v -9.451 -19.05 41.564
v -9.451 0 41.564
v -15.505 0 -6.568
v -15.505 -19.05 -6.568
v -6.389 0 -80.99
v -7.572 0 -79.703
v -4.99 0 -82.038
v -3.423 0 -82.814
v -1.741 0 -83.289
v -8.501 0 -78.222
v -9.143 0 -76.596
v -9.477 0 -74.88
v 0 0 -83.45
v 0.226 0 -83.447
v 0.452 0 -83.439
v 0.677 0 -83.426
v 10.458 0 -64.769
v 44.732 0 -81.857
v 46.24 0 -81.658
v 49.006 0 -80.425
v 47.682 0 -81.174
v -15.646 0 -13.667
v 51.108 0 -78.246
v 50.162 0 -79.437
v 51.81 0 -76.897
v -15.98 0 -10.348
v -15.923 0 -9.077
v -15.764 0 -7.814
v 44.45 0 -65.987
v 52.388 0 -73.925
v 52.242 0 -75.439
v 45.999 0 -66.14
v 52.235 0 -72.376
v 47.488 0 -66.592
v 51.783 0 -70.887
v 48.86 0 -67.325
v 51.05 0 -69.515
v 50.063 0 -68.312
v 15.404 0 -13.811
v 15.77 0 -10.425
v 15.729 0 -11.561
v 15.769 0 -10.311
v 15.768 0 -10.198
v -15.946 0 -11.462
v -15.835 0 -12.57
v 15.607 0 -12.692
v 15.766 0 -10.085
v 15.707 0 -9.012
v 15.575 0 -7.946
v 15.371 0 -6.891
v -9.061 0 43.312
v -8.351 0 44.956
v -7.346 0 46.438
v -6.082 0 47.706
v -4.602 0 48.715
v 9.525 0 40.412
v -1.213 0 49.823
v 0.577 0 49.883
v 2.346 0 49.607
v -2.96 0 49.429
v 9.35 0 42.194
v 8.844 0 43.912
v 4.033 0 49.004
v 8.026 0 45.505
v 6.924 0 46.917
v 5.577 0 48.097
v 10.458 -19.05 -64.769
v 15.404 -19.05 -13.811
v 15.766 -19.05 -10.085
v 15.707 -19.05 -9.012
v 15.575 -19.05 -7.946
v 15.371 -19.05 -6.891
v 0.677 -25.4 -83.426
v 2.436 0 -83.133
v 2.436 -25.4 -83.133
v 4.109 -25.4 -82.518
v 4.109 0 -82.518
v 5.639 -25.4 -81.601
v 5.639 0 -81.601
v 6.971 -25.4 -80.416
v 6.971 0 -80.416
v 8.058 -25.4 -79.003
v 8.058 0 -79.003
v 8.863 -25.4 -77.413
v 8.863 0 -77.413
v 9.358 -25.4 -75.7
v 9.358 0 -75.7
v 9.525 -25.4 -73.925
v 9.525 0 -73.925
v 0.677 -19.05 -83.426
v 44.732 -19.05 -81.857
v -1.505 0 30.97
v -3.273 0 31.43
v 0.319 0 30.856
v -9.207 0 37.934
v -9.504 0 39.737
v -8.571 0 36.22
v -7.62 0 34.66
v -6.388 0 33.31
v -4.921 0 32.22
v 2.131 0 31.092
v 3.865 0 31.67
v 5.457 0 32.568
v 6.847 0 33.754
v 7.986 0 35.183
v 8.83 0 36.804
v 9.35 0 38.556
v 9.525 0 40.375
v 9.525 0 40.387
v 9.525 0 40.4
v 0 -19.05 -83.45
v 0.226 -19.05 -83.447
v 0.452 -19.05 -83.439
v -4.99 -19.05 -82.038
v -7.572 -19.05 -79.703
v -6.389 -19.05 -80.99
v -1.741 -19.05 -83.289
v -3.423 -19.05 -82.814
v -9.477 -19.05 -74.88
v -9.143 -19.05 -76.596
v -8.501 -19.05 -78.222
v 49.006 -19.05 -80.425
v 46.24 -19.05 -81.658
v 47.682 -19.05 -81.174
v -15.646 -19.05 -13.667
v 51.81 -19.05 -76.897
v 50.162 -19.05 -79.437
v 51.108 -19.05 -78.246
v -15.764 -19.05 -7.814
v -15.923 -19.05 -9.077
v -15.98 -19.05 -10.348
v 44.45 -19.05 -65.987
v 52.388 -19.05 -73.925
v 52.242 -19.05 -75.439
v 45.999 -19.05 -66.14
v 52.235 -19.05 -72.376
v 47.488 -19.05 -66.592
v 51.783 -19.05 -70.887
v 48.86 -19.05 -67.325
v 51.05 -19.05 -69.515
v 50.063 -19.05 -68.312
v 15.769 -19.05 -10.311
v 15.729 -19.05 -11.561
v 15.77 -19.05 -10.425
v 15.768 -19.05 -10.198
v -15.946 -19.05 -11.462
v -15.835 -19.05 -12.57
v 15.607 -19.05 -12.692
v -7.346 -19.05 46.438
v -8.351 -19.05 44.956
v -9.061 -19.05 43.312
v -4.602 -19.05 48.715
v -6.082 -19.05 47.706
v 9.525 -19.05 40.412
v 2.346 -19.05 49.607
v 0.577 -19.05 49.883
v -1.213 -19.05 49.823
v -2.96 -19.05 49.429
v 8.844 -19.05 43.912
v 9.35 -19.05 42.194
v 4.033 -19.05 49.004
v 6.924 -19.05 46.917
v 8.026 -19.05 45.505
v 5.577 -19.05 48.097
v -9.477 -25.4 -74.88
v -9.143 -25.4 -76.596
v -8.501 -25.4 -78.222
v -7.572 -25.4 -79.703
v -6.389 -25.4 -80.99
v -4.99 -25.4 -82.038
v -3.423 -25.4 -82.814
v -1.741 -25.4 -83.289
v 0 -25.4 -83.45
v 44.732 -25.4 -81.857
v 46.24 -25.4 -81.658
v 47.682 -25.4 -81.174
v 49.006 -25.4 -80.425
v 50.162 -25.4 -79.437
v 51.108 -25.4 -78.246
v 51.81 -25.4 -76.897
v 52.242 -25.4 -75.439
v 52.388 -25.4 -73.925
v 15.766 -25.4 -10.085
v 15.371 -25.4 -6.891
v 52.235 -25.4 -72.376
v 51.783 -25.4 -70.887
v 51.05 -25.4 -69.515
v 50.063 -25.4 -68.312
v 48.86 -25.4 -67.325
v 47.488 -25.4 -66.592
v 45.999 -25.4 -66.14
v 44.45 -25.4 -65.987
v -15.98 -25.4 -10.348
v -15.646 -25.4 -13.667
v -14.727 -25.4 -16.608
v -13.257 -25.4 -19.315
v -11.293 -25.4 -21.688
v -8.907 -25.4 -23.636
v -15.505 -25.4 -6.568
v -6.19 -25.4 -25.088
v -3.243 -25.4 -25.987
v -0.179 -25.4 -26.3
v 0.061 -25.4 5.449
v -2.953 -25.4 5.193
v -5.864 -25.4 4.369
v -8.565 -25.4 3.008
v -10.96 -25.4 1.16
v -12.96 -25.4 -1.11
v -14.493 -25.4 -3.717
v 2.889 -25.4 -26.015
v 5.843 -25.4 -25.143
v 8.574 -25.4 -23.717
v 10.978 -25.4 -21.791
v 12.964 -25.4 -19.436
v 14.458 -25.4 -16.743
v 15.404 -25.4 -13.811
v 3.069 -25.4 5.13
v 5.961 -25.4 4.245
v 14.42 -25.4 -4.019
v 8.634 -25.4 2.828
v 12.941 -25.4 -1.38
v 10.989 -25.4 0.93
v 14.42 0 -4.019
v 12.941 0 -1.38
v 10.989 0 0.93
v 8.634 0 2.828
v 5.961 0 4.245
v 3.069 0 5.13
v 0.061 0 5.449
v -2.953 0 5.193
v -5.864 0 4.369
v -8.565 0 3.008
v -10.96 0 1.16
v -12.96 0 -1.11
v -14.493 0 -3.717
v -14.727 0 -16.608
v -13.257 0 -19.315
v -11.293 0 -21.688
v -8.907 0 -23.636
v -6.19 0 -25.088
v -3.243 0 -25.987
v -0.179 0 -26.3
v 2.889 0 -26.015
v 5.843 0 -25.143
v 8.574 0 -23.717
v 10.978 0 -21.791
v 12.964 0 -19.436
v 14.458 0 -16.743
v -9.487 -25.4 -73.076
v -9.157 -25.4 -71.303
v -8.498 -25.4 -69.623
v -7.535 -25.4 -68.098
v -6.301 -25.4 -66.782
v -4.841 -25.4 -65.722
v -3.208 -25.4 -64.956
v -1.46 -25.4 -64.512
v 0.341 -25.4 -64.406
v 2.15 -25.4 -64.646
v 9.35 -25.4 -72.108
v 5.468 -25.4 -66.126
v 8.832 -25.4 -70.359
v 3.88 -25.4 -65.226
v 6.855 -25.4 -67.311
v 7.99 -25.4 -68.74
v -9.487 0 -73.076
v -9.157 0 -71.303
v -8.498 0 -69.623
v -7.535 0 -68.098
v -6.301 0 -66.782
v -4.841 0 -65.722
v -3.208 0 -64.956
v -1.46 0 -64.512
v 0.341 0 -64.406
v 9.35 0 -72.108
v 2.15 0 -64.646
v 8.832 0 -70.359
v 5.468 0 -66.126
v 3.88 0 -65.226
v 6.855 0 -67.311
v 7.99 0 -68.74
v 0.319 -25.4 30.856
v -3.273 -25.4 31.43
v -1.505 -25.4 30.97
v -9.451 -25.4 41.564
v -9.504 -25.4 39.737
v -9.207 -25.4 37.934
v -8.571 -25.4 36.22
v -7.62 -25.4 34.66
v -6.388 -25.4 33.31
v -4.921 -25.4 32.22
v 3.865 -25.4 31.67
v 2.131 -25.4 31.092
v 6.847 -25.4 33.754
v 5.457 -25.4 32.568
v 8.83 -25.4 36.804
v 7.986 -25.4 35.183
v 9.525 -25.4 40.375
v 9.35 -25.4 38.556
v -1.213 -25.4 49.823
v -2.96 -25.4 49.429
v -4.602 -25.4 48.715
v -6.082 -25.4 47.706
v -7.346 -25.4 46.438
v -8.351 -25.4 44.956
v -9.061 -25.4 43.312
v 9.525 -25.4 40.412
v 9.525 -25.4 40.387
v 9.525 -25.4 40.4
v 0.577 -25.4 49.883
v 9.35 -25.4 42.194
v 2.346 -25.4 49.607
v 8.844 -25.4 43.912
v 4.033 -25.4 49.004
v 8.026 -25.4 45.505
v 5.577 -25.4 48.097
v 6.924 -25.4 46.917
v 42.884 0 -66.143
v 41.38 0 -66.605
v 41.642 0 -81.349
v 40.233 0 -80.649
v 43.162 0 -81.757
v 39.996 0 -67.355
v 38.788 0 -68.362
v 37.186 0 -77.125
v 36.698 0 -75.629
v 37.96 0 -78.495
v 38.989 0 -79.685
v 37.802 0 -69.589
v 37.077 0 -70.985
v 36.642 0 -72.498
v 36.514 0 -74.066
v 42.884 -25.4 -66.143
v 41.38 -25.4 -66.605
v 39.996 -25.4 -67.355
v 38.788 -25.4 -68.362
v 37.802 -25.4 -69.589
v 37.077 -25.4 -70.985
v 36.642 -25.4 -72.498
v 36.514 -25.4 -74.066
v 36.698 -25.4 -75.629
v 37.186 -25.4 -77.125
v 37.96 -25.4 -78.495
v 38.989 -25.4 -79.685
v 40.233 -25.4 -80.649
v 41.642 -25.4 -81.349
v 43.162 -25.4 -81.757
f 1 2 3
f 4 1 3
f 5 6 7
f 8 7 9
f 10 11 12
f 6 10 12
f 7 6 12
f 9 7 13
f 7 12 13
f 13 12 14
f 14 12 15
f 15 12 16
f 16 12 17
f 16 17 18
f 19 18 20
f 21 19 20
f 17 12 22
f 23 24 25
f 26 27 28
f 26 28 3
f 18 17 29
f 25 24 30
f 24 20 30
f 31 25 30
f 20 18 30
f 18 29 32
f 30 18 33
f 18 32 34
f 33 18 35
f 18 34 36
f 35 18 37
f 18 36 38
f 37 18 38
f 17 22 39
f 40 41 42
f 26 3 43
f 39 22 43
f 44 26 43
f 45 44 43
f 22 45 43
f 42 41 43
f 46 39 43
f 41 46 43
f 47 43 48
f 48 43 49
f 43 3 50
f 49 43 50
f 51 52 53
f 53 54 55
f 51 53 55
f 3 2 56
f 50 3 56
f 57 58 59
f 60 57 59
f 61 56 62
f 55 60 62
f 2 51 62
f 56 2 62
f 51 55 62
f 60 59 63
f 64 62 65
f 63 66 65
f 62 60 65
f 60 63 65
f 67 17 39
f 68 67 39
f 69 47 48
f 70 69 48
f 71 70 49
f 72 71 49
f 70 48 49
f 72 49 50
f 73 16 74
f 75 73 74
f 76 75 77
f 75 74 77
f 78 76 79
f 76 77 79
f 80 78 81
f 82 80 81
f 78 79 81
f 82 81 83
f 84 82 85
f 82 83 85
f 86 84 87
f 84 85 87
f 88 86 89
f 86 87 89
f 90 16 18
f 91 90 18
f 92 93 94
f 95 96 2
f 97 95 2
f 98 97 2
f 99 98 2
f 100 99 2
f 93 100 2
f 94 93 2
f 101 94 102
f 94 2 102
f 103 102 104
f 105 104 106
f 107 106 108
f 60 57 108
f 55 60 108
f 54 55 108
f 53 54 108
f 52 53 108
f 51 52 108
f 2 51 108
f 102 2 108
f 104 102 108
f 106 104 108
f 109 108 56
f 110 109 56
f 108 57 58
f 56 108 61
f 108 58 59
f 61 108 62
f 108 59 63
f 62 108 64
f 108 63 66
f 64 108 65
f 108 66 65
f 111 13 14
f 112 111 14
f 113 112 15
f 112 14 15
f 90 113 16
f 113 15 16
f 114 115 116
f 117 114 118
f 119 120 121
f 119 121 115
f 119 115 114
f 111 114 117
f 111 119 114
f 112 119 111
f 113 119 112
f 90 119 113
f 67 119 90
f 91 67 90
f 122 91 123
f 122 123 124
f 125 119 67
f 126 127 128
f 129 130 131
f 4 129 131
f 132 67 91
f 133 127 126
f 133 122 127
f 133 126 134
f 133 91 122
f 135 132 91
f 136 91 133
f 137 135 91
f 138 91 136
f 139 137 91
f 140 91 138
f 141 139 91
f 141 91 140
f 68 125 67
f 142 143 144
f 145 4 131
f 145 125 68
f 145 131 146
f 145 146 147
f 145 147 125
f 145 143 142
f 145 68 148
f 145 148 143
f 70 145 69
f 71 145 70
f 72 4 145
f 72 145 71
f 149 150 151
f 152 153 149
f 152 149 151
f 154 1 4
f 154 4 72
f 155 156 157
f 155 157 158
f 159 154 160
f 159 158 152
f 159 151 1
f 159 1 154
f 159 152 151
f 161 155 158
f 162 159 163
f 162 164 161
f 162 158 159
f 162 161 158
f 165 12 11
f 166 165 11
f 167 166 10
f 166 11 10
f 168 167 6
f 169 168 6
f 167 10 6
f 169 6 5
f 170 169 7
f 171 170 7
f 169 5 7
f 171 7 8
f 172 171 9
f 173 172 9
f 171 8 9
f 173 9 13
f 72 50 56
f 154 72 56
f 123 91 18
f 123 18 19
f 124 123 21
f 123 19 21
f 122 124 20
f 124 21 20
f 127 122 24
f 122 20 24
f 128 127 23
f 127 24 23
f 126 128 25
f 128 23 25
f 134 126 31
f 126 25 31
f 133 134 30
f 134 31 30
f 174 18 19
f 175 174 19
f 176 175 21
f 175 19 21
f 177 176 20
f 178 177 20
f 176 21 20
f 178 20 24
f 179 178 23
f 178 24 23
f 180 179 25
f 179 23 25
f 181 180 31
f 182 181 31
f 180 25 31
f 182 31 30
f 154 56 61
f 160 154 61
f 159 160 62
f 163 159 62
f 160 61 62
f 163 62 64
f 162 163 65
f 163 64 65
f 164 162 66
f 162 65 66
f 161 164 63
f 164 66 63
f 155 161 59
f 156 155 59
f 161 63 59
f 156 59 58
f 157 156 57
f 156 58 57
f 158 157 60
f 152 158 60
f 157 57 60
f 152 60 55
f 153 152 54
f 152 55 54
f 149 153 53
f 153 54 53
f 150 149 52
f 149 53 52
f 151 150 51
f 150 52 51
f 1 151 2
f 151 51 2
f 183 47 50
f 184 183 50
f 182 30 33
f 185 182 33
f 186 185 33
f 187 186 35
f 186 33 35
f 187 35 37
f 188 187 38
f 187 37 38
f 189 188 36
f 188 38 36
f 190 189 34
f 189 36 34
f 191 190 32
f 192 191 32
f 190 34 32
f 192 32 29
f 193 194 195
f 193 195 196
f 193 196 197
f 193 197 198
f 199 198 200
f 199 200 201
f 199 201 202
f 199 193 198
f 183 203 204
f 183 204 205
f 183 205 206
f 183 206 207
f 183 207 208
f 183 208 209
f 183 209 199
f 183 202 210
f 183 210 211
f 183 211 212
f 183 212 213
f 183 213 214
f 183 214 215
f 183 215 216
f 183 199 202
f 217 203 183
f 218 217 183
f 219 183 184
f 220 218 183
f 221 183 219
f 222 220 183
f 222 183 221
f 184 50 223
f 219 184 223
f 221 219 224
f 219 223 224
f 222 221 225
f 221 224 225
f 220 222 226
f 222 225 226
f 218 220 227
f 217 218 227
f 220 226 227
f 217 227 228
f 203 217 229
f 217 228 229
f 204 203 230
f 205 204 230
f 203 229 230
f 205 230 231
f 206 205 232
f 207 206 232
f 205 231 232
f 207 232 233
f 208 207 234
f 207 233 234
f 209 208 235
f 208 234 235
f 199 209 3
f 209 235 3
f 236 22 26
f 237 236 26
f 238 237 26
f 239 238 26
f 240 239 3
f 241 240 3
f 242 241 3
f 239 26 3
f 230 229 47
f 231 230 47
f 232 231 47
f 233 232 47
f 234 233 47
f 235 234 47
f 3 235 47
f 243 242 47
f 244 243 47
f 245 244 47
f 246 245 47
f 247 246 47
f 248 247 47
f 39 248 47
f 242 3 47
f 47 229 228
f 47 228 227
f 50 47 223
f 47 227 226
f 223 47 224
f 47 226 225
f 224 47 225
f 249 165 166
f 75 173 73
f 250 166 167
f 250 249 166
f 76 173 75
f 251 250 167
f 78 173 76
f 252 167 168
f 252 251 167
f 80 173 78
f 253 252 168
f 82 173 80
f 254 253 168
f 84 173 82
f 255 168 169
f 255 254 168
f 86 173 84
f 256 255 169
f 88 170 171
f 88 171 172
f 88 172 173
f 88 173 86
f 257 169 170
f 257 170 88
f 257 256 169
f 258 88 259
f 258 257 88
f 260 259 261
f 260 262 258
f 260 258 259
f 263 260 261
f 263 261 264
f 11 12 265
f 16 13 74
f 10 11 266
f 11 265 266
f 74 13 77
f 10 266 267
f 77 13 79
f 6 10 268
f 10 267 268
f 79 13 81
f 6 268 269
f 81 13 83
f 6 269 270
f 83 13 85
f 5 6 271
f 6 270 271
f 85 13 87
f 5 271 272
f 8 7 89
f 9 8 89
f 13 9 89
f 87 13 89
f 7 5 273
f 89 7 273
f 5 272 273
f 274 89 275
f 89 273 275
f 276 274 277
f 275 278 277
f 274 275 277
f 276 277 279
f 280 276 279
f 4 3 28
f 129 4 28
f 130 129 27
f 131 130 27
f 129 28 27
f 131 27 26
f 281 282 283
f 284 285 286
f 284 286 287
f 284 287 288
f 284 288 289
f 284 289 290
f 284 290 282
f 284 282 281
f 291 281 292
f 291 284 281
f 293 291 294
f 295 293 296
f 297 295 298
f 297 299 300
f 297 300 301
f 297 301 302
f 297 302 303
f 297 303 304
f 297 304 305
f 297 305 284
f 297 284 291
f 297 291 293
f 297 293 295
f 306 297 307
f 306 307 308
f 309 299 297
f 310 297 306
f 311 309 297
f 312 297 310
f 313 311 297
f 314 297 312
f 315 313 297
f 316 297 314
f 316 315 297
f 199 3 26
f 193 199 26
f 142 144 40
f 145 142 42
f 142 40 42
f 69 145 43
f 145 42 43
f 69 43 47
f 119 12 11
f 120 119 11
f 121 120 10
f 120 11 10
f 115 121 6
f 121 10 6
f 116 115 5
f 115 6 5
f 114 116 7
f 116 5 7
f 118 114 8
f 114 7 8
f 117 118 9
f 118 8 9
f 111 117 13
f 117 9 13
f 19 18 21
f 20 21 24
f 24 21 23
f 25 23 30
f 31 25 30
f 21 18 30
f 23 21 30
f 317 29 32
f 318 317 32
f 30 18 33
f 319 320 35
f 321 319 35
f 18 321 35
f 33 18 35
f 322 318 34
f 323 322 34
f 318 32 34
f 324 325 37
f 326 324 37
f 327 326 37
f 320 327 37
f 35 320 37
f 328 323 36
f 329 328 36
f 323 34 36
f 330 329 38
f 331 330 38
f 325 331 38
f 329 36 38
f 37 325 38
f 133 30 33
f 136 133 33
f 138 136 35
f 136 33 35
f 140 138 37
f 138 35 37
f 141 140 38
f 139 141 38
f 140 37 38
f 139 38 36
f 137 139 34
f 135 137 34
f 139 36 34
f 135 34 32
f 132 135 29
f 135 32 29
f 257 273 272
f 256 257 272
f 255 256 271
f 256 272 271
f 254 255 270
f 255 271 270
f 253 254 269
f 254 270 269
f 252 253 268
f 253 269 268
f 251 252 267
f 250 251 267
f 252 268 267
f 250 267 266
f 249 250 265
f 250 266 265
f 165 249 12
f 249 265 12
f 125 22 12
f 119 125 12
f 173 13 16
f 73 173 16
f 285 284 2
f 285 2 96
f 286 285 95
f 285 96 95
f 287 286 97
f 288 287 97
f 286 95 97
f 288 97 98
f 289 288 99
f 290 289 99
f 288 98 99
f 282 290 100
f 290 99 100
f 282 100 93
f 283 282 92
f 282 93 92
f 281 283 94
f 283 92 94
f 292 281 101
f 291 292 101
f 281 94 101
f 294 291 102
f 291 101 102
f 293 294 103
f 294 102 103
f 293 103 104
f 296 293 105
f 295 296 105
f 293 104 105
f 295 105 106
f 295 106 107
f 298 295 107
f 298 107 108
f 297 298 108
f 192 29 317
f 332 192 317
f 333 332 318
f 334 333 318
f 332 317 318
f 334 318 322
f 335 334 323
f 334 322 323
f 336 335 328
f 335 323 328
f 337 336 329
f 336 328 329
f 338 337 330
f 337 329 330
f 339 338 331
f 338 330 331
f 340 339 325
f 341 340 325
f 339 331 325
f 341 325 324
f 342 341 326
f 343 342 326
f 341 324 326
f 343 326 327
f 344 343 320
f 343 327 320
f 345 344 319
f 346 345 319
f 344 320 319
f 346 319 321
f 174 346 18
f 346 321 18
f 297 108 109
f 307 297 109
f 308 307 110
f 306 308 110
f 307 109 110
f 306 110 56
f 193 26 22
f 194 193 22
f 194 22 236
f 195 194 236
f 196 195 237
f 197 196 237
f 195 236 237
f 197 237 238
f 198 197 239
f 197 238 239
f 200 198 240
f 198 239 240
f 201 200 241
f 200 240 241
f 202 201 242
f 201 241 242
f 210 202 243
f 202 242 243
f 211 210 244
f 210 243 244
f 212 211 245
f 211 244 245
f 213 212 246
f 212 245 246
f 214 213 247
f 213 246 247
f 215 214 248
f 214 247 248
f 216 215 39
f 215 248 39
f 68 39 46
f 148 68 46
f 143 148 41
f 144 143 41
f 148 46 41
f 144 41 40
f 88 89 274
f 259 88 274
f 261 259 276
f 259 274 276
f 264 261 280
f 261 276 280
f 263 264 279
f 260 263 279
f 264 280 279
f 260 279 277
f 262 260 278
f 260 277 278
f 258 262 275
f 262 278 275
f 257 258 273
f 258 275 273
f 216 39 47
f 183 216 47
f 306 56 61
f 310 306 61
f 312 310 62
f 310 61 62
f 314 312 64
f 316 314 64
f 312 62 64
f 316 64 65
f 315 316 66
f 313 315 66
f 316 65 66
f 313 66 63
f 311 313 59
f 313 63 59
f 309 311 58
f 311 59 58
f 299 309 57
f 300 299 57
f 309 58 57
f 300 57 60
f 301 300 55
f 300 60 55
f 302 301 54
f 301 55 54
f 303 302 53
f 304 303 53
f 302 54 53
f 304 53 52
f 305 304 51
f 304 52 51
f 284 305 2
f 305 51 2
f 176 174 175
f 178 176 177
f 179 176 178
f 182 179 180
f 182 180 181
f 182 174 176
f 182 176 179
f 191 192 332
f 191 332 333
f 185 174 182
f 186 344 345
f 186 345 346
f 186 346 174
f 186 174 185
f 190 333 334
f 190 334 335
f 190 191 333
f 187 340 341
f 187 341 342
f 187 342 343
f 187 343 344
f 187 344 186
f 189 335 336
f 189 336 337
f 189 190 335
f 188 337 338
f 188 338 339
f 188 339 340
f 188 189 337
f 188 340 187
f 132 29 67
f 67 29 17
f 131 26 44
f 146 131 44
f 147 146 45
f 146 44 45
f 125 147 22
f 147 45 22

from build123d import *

# Parameters (mm, degrees)
F1_DEPTH = 25.4
F2_DEPTH = 19.05


with BuildPart() as f1:
    # F0 (on Front) → F1 (new body)
    with BuildSketch(Plane.XZ):
        with BuildLine():
            ThreePointArc((-9.4505353604, 41.5638555321), (-0.5955147738, 30.8687904621), (9.525, 40.3751560744))
            ThreePointArc((9.525, 40.3751560744), (9.5249820462, 40.3936498602), (9.5249281848, 40.4121435763))
            ThreePointArc((9.5249281848, 40.4121435763), (0.5770560461, 49.8826600223), (-9.4505353604, 41.5638555321))
        make_face()
    extrude(amount=F1_DEPTH)


with BuildPart() as f1b:
    # F0 (on Front) → F1, piece 2 (new body)
    with BuildSketch(Plane.XZ):
        with BuildLine():
            Line((15.7660711788, -10.0846397195), (15.371304716, -6.8906035395))
            ThreePointArc((15.371304716, -6.8906035395), (0.0606968294, 5.4492883552), (-15.5045872563, -6.5677652421))
            Line((-15.5045872563, -6.5677652421), (-15.9800981954, -10.3482270861))
            Line((-15.9800981954, -10.3482270861), (-15.6456242534, -13.6672845653))
            ThreePointArc((-15.6456242534, -13.6672845653), (-0.1786997991, -26.2996741605), (15.4044031981, -13.810882388))
            Line((15.4044031981, -13.810882388), (15.7660711788, -10.0846397195))
        make_face()
    extrude(amount=F1_DEPTH)


with BuildPart() as f1c:
    # F0 (on Front) → F1, piece 3 (new body)
    with BuildSketch(Plane.XZ):
        with BuildLine():
            ThreePointArc((0.3412708989, -64.4059595806), (-6.9491816059, -67.4106670775), (-9.4770004124, -74.8798770055))
            ThreePointArc((-9.4770004124, -74.8798770055), (-6.3886201528, -80.989626834), (0, -83.4498439256))
            Line((0, -83.4498439256), (0.6773435479, -83.4257297116))
            ThreePointArc((0.6773435479, -83.4257297116), (6.9705567315, -80.4161430139), (9.525, -73.9248439256))
            ThreePointArc((9.525, -73.9248439256), (6.8547877543, -67.3114098824), (0.3412708989, -64.4059595806))
        make_face()
    extrude(amount=F1_DEPTH)


with BuildPart() as f1d:
    # F0 (on Front) → F1, piece 4 (new body)
    with BuildSketch(Plane.XZ):
        with BuildLine():
            ThreePointArc((52.3875, -73.9248439256), (50.0626600757, -68.31218385), (44.45, -65.9873439256))
            ThreePointArc((44.45, -65.9873439256), (36.5137564458, -74.0660689178), (44.7324052746, -81.8573185402))
            ThreePointArc((44.7324052746, -81.8573185402), (50.1616327839, -79.4367544104), (52.3875, -73.9248439256))
        make_face()
    extrude(amount=F1_DEPTH)


with BuildPart() as f2:
    # F0 (on Front) → F2 (new body)
    with BuildSketch(Plane.XZ):
        with BuildLine():
            ThreePointArc((-9.4505353604, 41.5638555321), (-0.5955147738, 30.8687904621), (9.525, 40.3751560744))
            ThreePointArc((9.525, 40.3751560744), (9.5249820462, 40.3936498602), (9.5249281848, 40.4121435763))
            ThreePointArc((9.5249281848, 40.4121435763), (0.5770560461, 49.8826600223), (-9.4505353604, 41.5638555321))
        make_face()
        with BuildLine():
            ThreePointArc((9.5249281848, 40.4121435763), (9.5249820462, 40.3936498602), (9.525, 40.3751560744))
            ThreePointArc((9.525, 40.3751560744), (-0.5955147738, 30.8687904621), (-9.4505353604, 41.5638555321))
            Line((-9.4505353604, 41.5638555321), (-15.5045872563, -6.5677652421))
            ThreePointArc((-15.5045872563, -6.5677652421), (0.0606968294, 5.4492883552), (15.371304716, -6.8906035395))
            Line((15.371304716, -6.8906035395), (9.5249281848, 40.4121435763))
        make_face()
        with BuildLine():
            Line((15.7660711788, -10.0846397195), (15.371304716, -6.8906035395))
            ThreePointArc((15.371304716, -6.8906035395), (0.0606968294, 5.4492883552), (-15.5045872563, -6.5677652421))
            Line((-15.5045872563, -6.5677652421), (-15.9800981954, -10.3482270861))
            Line((-15.9800981954, -10.3482270861), (-15.6456242534, -13.6672845653))
            ThreePointArc((-15.6456242534, -13.6672845653), (-0.1786997991, -26.2996741605), (15.4044031981, -13.810882388))
            Line((15.4044031981, -13.810882388), (15.7660711788, -10.0846397195))
        make_face()
        with BuildLine():
            ThreePointArc((15.7660711788, -10.0846397195), (15.6498378192, -8.4775919222), (15.371304716, -6.8906035395))
            Line((15.371304716, -6.8906035395), (15.7660711788, -10.0846397195))
        make_face()
        with BuildLine():
            Line((-15.9800981954, -10.3482270861), (-15.5045872563, -6.5677652421))
            ThreePointArc((-15.5045872563, -6.5677652421), (-15.8561753502, -8.4436781627), (-15.9800981954, -10.3482270861))
        make_face()
        with BuildLine():
            ThreePointArc((15.7697169172, -10.4248439256), (15.7688054564, -10.2547320556), (15.7660711788, -10.0846397195))
            Line((15.7660711788, -10.0846397195), (15.4044031981, -13.810882388))
            ThreePointArc((15.4044031981, -13.810882388), (15.6781242602, -12.127687913), (15.7697169172, -10.4248439256))
        make_face()
        with BuildLine():
            Line((-15.6456242534, -13.6672845653), (-15.9800981954, -10.3482270861))
            ThreePointArc((-15.9800981954, -10.3482270861), (-15.9002837701, -12.0165657254), (-15.6456242534, -13.6672845653))
        make_face()
        with BuildLine():
            Line((10.4584548085, -64.7686804428), (15.4044031981, -13.810882388))
            ThreePointArc((15.4044031981, -13.810882388), (-0.1786997991, -26.2996741605), (-15.6456242534, -13.6672845653))
            Line((-15.6456242534, -13.6672845653), (-9.4770004124, -74.8798770055))
            ThreePointArc((-9.4770004124, -74.8798770055), (-6.9491816059, -67.4106670775), (0.3412708989, -64.4059595806))
            Line((0.3412708989, -64.4059595806), (10.4584548085, -64.7686804428))
        make_face()
        with BuildLine():
            Line((44.45, -65.9873439256), (10.4584548085, -64.7686804428))
            Line((10.4584548085, -64.7686804428), (0.3412708989, -64.4059595806))
            ThreePointArc((0.3412708989, -64.4059595806), (6.8547877543, -67.3114098824), (9.525, -73.9248439256))
            ThreePointArc((9.525, -73.9248439256), (6.9705567315, -80.4161430139), (0.6773435479, -83.4257297116))
            Line((0.6773435479, -83.4257297116), (44.7324052746, -81.8573185402))
            ThreePointArc((44.7324052746, -81.8573185402), (36.5137564458, -74.0660689178), (44.45, -65.9873439256))
        make_face()
        with BuildLine():
            ThreePointArc((0.3412708989, -64.4059595806), (-6.9491816059, -67.4106670775), (-9.4770004124, -74.8798770055))
            ThreePointArc((-9.4770004124, -74.8798770055), (-6.3886201528, -80.989626834), (0, -83.4498439256))
            Line((0, -83.4498439256), (0.6773435479, -83.4257297116))
            ThreePointArc((0.6773435479, -83.4257297116), (6.9705567315, -80.4161430139), (9.525, -73.9248439256))
            ThreePointArc((9.525, -73.9248439256), (6.8547877543, -67.3114098824), (0.3412708989, -64.4059595806))
        make_face()
        with BuildLine():
            ThreePointArc((52.3875, -73.9248439256), (50.0626600757, -68.31218385), (44.45, -65.9873439256))
            ThreePointArc((44.45, -65.9873439256), (36.5137564458, -74.0660689178), (44.7324052746, -81.8573185402))
            ThreePointArc((44.7324052746, -81.8573185402), (50.1616327839, -79.4367544104), (52.3875, -73.9248439256))
        make_face()
        with BuildLine():
            Line((0.6773435479, -83.4257297116), (0, -83.4498439256))
            ThreePointArc((0, -83.4498439256), (0.3388863295, -83.4438134631), (0.6773435479, -83.4257297116))
        make_face()
    extrude(amount=F2_DEPTH)


solid = Compound([f1.part, f1b.part, f1c.part, f1d.part, f2.part])
